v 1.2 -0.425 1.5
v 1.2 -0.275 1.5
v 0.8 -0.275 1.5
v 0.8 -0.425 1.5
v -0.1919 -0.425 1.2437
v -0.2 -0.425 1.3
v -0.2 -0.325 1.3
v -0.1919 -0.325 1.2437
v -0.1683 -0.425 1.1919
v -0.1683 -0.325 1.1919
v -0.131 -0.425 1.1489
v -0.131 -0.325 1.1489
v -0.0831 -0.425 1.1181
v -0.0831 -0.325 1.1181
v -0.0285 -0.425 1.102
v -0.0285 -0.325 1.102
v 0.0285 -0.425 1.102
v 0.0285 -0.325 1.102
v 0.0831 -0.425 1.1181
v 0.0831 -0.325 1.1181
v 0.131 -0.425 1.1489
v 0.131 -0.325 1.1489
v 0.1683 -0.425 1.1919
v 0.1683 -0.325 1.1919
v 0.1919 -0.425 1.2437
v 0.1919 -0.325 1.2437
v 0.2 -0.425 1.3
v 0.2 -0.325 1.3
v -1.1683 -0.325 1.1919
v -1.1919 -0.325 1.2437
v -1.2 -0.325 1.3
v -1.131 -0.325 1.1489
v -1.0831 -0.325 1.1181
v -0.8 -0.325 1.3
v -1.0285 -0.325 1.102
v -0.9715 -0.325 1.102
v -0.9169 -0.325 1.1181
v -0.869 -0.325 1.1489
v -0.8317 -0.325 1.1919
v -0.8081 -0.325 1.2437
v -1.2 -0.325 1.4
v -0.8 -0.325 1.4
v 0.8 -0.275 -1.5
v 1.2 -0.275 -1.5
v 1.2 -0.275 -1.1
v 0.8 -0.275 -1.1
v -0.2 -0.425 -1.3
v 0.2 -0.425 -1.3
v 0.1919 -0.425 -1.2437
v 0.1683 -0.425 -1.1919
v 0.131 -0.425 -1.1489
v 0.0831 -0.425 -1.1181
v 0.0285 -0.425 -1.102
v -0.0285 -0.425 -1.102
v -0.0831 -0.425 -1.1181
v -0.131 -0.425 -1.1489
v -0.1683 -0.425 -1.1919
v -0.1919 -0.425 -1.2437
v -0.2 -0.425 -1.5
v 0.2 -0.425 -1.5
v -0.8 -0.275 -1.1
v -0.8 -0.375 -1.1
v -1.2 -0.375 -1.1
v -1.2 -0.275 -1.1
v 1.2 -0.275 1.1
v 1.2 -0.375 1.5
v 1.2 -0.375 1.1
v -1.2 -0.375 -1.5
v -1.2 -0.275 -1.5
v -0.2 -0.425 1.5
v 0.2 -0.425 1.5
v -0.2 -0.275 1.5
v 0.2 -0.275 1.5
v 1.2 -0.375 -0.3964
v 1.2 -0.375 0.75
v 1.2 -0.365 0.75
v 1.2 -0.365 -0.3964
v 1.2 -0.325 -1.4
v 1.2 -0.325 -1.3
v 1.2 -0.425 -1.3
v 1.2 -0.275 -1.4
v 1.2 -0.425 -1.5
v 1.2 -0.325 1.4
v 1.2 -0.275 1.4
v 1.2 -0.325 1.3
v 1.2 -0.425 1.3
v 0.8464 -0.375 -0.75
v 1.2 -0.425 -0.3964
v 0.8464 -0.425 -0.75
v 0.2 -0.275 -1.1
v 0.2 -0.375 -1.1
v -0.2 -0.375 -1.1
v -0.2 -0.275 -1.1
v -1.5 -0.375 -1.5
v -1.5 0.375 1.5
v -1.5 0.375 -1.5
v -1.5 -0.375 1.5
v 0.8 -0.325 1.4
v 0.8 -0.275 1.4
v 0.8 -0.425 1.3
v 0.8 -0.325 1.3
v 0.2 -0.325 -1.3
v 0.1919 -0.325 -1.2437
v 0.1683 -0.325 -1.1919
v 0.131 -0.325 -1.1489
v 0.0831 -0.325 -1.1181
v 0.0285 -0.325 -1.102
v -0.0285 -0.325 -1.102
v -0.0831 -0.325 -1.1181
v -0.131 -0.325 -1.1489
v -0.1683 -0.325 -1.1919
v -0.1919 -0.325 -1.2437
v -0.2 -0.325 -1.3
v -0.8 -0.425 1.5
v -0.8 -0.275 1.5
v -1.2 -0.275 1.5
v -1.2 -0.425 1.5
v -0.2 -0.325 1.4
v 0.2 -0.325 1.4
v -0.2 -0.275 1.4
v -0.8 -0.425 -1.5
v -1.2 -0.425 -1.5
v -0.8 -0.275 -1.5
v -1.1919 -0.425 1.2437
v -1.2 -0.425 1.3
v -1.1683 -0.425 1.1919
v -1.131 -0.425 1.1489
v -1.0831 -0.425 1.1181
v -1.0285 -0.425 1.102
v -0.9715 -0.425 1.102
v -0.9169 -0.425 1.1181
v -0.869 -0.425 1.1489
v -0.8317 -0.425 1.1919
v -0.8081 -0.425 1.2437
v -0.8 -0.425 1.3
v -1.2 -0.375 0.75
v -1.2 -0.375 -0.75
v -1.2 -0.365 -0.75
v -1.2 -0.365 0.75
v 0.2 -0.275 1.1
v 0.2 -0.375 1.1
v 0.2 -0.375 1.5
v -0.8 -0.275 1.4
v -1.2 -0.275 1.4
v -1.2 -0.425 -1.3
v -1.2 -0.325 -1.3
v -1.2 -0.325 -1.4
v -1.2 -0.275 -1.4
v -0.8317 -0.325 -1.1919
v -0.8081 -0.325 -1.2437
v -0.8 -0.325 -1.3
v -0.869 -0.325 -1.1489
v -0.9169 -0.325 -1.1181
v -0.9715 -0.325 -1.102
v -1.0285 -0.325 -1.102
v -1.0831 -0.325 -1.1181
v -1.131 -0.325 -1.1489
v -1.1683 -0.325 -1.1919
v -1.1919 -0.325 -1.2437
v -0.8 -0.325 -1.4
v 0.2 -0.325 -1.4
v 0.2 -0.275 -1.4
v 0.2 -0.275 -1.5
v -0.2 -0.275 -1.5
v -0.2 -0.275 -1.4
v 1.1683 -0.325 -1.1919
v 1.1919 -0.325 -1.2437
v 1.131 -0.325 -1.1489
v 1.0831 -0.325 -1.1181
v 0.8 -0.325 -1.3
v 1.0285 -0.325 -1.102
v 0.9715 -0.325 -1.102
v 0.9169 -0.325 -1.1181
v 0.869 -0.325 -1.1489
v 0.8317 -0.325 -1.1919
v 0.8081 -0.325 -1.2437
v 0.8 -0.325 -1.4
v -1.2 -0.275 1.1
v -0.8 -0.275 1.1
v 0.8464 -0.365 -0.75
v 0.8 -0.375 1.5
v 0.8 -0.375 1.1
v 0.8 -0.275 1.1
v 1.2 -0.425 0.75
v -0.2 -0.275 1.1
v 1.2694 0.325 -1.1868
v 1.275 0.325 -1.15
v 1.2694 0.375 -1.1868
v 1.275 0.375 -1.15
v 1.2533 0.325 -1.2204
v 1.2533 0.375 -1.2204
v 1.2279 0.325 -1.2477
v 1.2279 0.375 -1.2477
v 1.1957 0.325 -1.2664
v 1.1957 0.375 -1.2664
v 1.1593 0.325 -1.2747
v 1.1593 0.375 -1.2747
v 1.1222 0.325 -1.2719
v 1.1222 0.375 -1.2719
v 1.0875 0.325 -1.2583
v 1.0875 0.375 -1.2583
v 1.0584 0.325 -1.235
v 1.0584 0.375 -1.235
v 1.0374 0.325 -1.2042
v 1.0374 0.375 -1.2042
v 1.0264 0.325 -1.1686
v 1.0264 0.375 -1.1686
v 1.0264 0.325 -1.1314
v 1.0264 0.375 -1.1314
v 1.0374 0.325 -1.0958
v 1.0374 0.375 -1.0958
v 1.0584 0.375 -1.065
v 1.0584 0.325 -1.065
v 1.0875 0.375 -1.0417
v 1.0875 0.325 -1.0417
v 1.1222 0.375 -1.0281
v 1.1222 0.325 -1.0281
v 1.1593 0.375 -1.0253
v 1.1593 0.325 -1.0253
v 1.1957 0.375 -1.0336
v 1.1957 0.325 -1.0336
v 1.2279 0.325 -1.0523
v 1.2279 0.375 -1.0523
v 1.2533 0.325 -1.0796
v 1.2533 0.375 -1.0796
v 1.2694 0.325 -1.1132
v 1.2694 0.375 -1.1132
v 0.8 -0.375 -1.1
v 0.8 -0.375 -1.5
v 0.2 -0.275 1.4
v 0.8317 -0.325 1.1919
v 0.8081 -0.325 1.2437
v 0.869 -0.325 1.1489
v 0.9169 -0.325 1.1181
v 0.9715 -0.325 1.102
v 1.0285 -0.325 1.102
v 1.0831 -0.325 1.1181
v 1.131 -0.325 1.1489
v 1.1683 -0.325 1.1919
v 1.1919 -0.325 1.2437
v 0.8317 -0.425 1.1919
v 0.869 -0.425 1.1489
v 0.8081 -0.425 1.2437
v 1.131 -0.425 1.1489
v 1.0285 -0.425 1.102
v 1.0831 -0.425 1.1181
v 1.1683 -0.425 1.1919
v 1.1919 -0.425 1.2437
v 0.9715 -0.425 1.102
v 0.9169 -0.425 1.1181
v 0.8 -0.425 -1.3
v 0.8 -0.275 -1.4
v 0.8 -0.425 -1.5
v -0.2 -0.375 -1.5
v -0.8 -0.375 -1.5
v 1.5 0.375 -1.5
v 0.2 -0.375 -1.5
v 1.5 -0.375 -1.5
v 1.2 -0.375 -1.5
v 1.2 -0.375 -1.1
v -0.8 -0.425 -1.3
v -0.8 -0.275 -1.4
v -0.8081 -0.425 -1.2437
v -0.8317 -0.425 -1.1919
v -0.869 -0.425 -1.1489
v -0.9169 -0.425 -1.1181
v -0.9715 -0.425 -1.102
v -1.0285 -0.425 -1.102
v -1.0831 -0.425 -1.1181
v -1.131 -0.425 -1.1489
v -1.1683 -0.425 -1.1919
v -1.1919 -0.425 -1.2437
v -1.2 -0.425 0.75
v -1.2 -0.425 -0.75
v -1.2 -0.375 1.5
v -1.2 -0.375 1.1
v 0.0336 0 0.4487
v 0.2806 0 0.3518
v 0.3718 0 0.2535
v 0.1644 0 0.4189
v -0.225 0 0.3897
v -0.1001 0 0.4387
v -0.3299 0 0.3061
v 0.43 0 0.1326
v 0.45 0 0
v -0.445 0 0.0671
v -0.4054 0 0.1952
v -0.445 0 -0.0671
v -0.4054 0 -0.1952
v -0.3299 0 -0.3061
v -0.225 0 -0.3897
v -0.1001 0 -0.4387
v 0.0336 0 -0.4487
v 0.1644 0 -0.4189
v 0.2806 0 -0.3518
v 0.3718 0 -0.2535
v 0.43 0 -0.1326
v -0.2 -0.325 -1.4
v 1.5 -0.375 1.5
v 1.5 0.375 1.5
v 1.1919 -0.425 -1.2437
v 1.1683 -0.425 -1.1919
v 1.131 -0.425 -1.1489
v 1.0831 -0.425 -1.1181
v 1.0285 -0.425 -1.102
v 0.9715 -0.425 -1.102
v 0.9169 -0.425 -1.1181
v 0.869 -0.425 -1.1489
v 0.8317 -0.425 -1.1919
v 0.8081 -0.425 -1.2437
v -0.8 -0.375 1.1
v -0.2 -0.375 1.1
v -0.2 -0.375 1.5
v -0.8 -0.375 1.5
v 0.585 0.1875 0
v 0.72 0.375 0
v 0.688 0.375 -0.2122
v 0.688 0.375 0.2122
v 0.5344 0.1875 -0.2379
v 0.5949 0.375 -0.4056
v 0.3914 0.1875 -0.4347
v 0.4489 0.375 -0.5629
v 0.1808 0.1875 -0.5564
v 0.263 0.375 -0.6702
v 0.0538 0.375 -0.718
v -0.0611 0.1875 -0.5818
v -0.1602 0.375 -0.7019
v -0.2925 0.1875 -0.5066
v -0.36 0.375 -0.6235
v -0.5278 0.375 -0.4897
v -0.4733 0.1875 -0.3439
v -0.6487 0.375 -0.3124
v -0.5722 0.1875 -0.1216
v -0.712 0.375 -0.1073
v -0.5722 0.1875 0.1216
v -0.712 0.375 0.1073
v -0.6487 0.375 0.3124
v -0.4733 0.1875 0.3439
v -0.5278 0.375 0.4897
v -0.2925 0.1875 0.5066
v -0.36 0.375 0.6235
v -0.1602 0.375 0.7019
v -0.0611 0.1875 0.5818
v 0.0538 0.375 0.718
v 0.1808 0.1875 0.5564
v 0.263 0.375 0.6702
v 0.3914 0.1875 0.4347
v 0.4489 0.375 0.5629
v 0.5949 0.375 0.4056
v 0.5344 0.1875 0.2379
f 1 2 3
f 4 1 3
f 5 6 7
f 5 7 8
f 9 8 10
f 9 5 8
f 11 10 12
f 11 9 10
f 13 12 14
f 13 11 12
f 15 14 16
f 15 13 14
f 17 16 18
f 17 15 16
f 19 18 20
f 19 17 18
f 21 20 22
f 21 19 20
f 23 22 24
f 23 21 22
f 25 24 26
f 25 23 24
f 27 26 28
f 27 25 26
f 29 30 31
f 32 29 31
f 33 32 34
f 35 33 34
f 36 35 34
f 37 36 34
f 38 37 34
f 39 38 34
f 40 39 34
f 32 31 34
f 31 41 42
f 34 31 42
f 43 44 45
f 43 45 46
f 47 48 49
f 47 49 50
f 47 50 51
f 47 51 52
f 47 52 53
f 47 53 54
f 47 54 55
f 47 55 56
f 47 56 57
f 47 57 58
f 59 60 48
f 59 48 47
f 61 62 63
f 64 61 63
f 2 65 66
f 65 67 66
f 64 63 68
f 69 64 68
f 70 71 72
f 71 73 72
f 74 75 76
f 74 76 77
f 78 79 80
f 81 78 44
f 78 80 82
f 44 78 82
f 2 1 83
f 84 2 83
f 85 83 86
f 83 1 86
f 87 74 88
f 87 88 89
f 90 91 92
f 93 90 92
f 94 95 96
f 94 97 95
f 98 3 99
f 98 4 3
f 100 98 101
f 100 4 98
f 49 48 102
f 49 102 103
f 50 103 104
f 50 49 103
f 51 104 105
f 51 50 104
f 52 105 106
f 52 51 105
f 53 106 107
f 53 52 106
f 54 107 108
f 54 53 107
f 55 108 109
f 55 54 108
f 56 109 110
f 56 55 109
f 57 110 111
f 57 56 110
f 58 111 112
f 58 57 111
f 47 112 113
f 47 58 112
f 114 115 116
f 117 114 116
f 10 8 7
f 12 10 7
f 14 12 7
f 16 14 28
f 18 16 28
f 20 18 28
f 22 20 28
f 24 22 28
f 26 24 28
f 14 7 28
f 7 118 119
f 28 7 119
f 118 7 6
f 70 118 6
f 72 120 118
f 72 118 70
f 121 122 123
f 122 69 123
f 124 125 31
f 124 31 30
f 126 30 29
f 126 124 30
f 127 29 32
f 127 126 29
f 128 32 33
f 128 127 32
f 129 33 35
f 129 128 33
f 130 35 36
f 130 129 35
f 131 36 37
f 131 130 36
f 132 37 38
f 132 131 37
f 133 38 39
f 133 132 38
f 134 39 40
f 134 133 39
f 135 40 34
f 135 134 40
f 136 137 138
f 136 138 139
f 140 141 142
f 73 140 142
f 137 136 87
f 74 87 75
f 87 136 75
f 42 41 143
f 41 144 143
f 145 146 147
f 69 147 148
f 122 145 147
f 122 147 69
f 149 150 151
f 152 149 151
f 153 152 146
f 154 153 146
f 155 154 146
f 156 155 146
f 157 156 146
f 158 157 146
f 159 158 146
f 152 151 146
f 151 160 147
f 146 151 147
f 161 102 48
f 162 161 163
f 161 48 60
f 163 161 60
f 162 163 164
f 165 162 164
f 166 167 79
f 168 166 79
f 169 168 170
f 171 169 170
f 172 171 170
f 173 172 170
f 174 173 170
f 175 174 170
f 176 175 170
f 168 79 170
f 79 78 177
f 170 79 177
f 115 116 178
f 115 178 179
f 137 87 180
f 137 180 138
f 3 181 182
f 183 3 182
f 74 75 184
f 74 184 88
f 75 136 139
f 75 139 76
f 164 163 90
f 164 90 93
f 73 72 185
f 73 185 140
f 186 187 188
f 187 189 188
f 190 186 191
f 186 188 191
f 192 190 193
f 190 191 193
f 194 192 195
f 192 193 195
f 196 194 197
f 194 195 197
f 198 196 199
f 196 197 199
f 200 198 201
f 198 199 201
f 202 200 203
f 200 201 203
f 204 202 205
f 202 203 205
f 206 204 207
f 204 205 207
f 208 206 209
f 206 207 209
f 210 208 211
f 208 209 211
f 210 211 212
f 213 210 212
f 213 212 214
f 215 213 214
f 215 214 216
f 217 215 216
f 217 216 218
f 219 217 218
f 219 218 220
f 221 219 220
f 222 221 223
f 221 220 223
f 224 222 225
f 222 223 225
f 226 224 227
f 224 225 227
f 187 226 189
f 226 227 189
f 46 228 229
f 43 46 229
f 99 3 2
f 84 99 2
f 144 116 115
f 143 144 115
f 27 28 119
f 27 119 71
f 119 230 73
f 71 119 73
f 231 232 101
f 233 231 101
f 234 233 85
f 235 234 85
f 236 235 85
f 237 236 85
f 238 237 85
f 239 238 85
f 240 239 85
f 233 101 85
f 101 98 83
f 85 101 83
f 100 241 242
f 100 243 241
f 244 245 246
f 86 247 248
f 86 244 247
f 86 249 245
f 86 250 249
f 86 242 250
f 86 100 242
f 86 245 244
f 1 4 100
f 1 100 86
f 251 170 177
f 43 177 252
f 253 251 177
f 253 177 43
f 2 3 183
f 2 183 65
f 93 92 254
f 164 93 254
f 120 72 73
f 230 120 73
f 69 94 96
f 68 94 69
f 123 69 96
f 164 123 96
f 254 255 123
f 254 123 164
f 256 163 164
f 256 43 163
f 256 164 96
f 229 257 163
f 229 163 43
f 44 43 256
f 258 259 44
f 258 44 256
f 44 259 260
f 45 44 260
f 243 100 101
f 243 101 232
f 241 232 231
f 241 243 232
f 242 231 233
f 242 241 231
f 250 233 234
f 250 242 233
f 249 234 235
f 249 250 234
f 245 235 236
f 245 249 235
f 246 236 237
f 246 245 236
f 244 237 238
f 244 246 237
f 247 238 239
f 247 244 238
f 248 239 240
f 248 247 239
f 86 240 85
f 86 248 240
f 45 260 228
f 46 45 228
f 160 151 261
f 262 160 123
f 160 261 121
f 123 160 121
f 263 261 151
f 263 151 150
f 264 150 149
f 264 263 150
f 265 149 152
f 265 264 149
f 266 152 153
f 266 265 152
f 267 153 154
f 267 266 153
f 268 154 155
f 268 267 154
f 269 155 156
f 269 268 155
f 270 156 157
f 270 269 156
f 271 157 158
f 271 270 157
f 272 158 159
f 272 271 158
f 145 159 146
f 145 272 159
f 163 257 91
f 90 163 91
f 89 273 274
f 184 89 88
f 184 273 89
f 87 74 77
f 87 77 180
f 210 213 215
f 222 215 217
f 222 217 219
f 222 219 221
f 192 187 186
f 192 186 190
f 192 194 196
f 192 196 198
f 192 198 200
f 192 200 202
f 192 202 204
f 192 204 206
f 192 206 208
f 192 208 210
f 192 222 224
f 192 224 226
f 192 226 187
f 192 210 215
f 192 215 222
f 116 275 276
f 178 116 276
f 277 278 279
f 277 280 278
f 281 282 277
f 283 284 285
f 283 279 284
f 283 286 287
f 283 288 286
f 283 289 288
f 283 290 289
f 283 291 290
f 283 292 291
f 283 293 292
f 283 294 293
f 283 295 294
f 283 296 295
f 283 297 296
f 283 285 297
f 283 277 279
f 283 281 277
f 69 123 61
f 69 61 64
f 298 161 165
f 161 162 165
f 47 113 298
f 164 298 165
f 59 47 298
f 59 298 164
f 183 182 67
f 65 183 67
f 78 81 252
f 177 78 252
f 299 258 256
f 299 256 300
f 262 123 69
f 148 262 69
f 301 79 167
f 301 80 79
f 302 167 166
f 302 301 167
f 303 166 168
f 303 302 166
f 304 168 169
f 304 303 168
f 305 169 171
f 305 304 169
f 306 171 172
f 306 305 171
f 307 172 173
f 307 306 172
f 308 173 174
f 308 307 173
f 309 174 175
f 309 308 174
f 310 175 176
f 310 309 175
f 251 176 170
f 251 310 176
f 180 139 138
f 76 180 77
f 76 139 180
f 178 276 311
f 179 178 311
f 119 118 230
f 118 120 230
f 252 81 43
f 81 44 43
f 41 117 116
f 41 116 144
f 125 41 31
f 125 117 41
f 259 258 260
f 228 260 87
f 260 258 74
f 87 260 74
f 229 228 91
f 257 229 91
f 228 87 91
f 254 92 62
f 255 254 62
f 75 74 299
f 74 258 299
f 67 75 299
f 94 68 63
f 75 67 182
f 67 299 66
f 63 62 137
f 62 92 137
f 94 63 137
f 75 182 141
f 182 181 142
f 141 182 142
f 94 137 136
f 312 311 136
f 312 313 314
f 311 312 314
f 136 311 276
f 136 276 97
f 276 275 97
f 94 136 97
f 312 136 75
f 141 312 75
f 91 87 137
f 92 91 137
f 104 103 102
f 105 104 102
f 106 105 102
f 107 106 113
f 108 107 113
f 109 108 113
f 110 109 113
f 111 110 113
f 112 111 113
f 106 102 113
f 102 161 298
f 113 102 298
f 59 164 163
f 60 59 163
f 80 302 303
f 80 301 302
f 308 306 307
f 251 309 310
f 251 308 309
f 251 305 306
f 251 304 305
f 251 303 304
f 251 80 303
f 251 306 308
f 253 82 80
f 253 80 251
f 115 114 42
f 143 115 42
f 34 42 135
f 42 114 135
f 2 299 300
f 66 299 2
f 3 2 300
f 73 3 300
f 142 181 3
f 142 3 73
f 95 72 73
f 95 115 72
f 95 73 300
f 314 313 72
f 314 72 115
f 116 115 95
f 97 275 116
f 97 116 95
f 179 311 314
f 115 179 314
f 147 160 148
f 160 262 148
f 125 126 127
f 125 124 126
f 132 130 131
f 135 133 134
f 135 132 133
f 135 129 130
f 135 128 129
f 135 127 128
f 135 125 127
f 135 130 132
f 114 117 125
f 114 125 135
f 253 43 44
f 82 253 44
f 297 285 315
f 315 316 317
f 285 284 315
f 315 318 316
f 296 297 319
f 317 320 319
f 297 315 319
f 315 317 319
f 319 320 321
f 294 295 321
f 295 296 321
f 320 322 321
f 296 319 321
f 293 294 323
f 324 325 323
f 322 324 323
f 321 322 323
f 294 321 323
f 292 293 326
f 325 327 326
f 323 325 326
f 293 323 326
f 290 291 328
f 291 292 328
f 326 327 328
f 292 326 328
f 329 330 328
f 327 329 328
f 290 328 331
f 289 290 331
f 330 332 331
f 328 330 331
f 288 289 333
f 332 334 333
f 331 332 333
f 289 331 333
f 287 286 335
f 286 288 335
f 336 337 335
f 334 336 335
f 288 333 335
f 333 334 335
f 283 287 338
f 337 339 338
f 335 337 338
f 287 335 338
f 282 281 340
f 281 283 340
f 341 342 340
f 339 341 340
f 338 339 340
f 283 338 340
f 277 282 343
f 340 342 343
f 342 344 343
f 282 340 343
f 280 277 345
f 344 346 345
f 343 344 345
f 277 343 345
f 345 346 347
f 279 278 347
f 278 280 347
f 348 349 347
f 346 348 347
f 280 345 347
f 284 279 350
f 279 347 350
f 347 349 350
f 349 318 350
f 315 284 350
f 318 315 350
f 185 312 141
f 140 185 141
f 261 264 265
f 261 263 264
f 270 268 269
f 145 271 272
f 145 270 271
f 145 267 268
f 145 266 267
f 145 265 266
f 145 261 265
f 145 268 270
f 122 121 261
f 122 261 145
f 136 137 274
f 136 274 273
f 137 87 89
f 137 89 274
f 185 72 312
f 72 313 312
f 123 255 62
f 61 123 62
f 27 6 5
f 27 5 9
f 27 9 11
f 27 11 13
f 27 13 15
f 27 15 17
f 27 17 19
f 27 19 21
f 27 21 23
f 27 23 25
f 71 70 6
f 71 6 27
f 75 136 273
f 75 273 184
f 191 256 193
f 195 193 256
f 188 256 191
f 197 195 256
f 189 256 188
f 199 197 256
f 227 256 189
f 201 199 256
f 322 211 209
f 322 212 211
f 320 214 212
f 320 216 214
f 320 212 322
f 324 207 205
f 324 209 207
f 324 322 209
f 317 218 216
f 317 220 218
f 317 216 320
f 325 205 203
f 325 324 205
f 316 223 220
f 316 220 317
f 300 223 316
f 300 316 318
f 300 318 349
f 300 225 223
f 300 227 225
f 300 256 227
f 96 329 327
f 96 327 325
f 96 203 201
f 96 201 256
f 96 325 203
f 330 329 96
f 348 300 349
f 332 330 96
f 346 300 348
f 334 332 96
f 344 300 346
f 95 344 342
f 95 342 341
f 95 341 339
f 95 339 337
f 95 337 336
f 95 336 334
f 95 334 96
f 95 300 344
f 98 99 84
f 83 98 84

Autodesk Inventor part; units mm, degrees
ref_plane "YZ Plane" through (0, 0, 0) normal (1, 0, 0) x (0, 1, 0)
ref_plane "XZ Plane" through (0, 0, 0) normal (0, 1, 0) x (-1, 0, 0)
ref_plane "XY Plane" through (0, 0, 0) normal (0, 0, 1) x (1, 0, 0)
sketch "Sketch1" plane through (0, 0, 0) normal (0, 1, 0) x (-1, 0, 0)
  line L0 (-1.5, 1.5) -> (1.5, 1.5)
  line L1 (1.5, 1.5) -> (1.5, -1.5)
  line L2 (1.5, -1.5) -> (-1.5, -1.5)
  line L3 (-1.5, -1.5) -> (-1.5, 1.5)
  line L4 (-1.5, 1.5) -> (1.5, -1.5) construction
  line L5 (1.5, 1.5) -> (-1.5, -1.5) construction
  point P0 (0, 0)
  dimension "d0" = 3
  dimension "d1" = 3
extrude "Extrusion1" add sketch "Sketch1" along normal mid plane 0.75
sketch "Sketch3" plane through (0, -0.375, 0) normal (0, -1, 0) x (1, 0, 0)
  line L0 (-1.5, 1.5) -> (1.5, 1.5) projected
  line L1 (0.2, 1.5) -> (-0.2, 1.5)
  line L2 (-0.2, 1.5) -> (-0.2, 1.1)
  line L3 (-0.2, 1.1) -> (0.2, 1.1)
  line L4 (0.2, 1.1) -> (0.2, 1.5)
  point P0 (0, 0)
  point P1 (0, 1.1)
  dimension "d6" = 0.4
  dimension "d7" = 0.4
extrude "Extrusion2" cut sketch "Sketch3" against normal blind 0.1
sketch "Sketch4" plane through (0, -0.275, 0) normal (0, -1, 0) x (1, 0, 0)
  line L0 (-0.2, 1.1) -> (-0.2, 1.5) projected
  line L1 (0.2, 1.5) -> (-0.2, 1.5)
  line L2 (-0.2, 1.5) -> (-0.2, 1.4)
  line L3 (-0.2, 1.4) -> (0.2, 1.4)
  line L4 (0.2, 1.4) -> (0.2, 1.5)
  line L5 (0.2, 1.5) -> (0.2, 1.1) projected
  point P0 (0, 0)
  dimension "d10" = 0.1
extrude "Extrusion3" add sketch "Sketch4" along normal blind 0.15 separate body
sketch "Sketch6" plane through (0, -0.425, 0) normal (0, -1, 0) x (1, 0, 0)
  line L0 (-0.2, 1.4) -> (0.2, 1.4) projected
  line L1 (0.2, 1.4) -> (0.2, 1.3)
  line L2 (-0.2, 1.4) -> (-0.2, 1.3)
  line L3 (-0.2, 1.1) -> (-0.2, 1.5) projected
  arc A0 (-0.2, 1.3) -> (0.2, 1.3) centre (0, 1.3) ccw
  line L4 (0.25, 1.1) -> (-0.25, 1.1) construction
  line L5 (0.2, 1.1) -> (-0.2, 1.1) projected
  point P0 (0, 0)
  point P1 (0, 1.1)
  dimension "d13" = 0.5
extrude "Extrusion4" add sketch "Sketch6" against normal blind 0.1 contours L0 L1 A0 L2 bodies 2
pattern_linear "Rectangular Pattern1" count 2 spacing 1 along (-1, 0, 0) count 2 spacing 1 along (1, 0, 0) of "Extrusion2" bodies 1
pattern_linear "Rectangular Pattern2" count 2 spacing 1 along (-1, 0, 0) count 2 spacing 1 along (1, 0, 0) of "Extrusion3", "Extrusion4" bodies 2
mirror "Mirror1" about plane through (0, 0, 0) normal (0, 0, 1) of "Extrusion2", "Rectangular Pattern1" bodies 1
mirror "Mirror2" about plane through (0, 0, 0) normal (0, 0, 1) of "Extrusion3", "Extrusion4", "Rectangular Pattern2" bodies 2
sketch "Sketch7" plane through (0, -0.375, 0) normal (0, -1, 0) x (1, 0, 0)
  line L0 (-1.2, 0.75) -> (1.2, 0.75)
  line L1 (1.2, 0.75) -> (1.2, -0.3964)
  line L2 (0.8464, -0.75) -> (-1.2, -0.75)
  line L3 (-1.2, -0.75) -> (-1.2, 0.75)
  line L4 (-1.2, 0.75) -> (1.2, -0.75) construction
  line L5 (1.2, 0.75) -> (-1.2, -0.75) construction
  line L6 (1.2, -0.3964) -> (0.8464, -0.75)
  point P0 (0, 0)
  point P1 (-0.1768, -0.75)
  point P2 (1.2, 0.1768)
  dimension "d28" = 1.5
  dimension "d29" = 2.4
  dimension "d30" = 135
  dimension "d31" = 0.5
extrude "Extrusion5" cut sketch "Sketch7" against normal blind 0.01 bodies 1
extrude "Extrusion6" add sketch "Sketch7" along normal up to surface (0.05 mm away) bodies 2
sketch "Sketch8" plane through (0, 0.375, 0) normal (0, 1, 0) x (1, 0, 0)
  circle A0 centre (0, 0) radius 0.72
  dimension "d36" = 1.44
sketch "Sketch9" plane through (0, 0, 0) normal (0, 1, 0) x (-1, 0, 0)
  circle A0 centre (0, 0) radius 0.45
  dimension "d37" = 0.9
loft "Loft1" cut profiles "Sketch8", "Sketch9" bodies 1
sketch "Sketch10" plane through (0, 0.375, 0) normal (0, 1, 0) x (1, 0, 0)
  circle A0 centre (1.15, 1.15) radius 0.125
  line L0 (1.5, -1.5) -> (1.5, 1.5) projected
  line L1 (1.5, 1.5) -> (-1.5, 1.5) projected
  point P0 (0, 0)
  dimension "d42" = 0.25
  dimension "d43" = 0.35
  dimension "d44" = 0.35
extrude "Extrusion7" cut sketch "Sketch10" against normal blind 0.05 bodies 1
properties part number "3x3 6-pin DFN"
